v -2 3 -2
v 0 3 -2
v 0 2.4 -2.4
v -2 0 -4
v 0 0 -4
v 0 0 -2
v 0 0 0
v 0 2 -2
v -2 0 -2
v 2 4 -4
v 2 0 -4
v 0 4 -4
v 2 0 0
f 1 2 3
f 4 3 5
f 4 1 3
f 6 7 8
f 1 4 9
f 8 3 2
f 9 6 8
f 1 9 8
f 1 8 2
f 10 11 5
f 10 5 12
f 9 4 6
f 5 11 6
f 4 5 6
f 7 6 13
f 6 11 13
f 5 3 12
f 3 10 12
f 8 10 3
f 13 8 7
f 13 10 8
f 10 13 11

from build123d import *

# Parameters (mm, degrees)
SKETCH1_W           = 4
SKETCH1_H           = 4
BOSS_EXTRUDE1_DEPTH = 2
SKETCH2_W           = 2
SKETCH2_H           = 3
BOSS_EXTRUDE2_DEPTH = 2
CUT_EXTRUDE1_DEPTH  = 2
CUT_EXTRUDE2_DEPTH  = 2


with BuildPart() as part:
    # Sketch1 → Boss-Extrude1 (new body)
    with BuildSketch(Plane(origin=(0, 0, 0), x_dir=(0, 0, -1), z_dir=(1, 0, 0))):
        with Locations((2, 2)):
            Rectangle(SKETCH1_W, SKETCH1_H)
    extrude(amount=BOSS_EXTRUDE1_DEPTH)

    # Sketch2 → Boss-Extrude2 (add)
    with BuildSketch(Plane.ZY):
        with Locations((-3, 1.5)):
            Rectangle(SKETCH2_W, SKETCH2_H)
    extrude(amount=BOSS_EXTRUDE2_DEPTH)

    # Sketch3 → Cut-Extrude1 (cut)
    with BuildSketch(Plane.ZY.offset(2)):
        Polygon((-2, 3), (-4, 0), (-4, 3), align=None)
    extrude(amount=-CUT_EXTRUDE1_DEPTH, mode=Mode.SUBTRACT)

    # Sketch4 → Cut-Extrude2 (cut)
    with BuildSketch(Plane(origin=(2, 0, 0), x_dir=(0, 0, -1), z_dir=(1, 0, 0))):
        Polygon((4, 4), (0, 0), (0, 4), align=None)
    extrude(amount=-CUT_EXTRUDE2_DEPTH, mode=Mode.SUBTRACT)


solid = part.part
